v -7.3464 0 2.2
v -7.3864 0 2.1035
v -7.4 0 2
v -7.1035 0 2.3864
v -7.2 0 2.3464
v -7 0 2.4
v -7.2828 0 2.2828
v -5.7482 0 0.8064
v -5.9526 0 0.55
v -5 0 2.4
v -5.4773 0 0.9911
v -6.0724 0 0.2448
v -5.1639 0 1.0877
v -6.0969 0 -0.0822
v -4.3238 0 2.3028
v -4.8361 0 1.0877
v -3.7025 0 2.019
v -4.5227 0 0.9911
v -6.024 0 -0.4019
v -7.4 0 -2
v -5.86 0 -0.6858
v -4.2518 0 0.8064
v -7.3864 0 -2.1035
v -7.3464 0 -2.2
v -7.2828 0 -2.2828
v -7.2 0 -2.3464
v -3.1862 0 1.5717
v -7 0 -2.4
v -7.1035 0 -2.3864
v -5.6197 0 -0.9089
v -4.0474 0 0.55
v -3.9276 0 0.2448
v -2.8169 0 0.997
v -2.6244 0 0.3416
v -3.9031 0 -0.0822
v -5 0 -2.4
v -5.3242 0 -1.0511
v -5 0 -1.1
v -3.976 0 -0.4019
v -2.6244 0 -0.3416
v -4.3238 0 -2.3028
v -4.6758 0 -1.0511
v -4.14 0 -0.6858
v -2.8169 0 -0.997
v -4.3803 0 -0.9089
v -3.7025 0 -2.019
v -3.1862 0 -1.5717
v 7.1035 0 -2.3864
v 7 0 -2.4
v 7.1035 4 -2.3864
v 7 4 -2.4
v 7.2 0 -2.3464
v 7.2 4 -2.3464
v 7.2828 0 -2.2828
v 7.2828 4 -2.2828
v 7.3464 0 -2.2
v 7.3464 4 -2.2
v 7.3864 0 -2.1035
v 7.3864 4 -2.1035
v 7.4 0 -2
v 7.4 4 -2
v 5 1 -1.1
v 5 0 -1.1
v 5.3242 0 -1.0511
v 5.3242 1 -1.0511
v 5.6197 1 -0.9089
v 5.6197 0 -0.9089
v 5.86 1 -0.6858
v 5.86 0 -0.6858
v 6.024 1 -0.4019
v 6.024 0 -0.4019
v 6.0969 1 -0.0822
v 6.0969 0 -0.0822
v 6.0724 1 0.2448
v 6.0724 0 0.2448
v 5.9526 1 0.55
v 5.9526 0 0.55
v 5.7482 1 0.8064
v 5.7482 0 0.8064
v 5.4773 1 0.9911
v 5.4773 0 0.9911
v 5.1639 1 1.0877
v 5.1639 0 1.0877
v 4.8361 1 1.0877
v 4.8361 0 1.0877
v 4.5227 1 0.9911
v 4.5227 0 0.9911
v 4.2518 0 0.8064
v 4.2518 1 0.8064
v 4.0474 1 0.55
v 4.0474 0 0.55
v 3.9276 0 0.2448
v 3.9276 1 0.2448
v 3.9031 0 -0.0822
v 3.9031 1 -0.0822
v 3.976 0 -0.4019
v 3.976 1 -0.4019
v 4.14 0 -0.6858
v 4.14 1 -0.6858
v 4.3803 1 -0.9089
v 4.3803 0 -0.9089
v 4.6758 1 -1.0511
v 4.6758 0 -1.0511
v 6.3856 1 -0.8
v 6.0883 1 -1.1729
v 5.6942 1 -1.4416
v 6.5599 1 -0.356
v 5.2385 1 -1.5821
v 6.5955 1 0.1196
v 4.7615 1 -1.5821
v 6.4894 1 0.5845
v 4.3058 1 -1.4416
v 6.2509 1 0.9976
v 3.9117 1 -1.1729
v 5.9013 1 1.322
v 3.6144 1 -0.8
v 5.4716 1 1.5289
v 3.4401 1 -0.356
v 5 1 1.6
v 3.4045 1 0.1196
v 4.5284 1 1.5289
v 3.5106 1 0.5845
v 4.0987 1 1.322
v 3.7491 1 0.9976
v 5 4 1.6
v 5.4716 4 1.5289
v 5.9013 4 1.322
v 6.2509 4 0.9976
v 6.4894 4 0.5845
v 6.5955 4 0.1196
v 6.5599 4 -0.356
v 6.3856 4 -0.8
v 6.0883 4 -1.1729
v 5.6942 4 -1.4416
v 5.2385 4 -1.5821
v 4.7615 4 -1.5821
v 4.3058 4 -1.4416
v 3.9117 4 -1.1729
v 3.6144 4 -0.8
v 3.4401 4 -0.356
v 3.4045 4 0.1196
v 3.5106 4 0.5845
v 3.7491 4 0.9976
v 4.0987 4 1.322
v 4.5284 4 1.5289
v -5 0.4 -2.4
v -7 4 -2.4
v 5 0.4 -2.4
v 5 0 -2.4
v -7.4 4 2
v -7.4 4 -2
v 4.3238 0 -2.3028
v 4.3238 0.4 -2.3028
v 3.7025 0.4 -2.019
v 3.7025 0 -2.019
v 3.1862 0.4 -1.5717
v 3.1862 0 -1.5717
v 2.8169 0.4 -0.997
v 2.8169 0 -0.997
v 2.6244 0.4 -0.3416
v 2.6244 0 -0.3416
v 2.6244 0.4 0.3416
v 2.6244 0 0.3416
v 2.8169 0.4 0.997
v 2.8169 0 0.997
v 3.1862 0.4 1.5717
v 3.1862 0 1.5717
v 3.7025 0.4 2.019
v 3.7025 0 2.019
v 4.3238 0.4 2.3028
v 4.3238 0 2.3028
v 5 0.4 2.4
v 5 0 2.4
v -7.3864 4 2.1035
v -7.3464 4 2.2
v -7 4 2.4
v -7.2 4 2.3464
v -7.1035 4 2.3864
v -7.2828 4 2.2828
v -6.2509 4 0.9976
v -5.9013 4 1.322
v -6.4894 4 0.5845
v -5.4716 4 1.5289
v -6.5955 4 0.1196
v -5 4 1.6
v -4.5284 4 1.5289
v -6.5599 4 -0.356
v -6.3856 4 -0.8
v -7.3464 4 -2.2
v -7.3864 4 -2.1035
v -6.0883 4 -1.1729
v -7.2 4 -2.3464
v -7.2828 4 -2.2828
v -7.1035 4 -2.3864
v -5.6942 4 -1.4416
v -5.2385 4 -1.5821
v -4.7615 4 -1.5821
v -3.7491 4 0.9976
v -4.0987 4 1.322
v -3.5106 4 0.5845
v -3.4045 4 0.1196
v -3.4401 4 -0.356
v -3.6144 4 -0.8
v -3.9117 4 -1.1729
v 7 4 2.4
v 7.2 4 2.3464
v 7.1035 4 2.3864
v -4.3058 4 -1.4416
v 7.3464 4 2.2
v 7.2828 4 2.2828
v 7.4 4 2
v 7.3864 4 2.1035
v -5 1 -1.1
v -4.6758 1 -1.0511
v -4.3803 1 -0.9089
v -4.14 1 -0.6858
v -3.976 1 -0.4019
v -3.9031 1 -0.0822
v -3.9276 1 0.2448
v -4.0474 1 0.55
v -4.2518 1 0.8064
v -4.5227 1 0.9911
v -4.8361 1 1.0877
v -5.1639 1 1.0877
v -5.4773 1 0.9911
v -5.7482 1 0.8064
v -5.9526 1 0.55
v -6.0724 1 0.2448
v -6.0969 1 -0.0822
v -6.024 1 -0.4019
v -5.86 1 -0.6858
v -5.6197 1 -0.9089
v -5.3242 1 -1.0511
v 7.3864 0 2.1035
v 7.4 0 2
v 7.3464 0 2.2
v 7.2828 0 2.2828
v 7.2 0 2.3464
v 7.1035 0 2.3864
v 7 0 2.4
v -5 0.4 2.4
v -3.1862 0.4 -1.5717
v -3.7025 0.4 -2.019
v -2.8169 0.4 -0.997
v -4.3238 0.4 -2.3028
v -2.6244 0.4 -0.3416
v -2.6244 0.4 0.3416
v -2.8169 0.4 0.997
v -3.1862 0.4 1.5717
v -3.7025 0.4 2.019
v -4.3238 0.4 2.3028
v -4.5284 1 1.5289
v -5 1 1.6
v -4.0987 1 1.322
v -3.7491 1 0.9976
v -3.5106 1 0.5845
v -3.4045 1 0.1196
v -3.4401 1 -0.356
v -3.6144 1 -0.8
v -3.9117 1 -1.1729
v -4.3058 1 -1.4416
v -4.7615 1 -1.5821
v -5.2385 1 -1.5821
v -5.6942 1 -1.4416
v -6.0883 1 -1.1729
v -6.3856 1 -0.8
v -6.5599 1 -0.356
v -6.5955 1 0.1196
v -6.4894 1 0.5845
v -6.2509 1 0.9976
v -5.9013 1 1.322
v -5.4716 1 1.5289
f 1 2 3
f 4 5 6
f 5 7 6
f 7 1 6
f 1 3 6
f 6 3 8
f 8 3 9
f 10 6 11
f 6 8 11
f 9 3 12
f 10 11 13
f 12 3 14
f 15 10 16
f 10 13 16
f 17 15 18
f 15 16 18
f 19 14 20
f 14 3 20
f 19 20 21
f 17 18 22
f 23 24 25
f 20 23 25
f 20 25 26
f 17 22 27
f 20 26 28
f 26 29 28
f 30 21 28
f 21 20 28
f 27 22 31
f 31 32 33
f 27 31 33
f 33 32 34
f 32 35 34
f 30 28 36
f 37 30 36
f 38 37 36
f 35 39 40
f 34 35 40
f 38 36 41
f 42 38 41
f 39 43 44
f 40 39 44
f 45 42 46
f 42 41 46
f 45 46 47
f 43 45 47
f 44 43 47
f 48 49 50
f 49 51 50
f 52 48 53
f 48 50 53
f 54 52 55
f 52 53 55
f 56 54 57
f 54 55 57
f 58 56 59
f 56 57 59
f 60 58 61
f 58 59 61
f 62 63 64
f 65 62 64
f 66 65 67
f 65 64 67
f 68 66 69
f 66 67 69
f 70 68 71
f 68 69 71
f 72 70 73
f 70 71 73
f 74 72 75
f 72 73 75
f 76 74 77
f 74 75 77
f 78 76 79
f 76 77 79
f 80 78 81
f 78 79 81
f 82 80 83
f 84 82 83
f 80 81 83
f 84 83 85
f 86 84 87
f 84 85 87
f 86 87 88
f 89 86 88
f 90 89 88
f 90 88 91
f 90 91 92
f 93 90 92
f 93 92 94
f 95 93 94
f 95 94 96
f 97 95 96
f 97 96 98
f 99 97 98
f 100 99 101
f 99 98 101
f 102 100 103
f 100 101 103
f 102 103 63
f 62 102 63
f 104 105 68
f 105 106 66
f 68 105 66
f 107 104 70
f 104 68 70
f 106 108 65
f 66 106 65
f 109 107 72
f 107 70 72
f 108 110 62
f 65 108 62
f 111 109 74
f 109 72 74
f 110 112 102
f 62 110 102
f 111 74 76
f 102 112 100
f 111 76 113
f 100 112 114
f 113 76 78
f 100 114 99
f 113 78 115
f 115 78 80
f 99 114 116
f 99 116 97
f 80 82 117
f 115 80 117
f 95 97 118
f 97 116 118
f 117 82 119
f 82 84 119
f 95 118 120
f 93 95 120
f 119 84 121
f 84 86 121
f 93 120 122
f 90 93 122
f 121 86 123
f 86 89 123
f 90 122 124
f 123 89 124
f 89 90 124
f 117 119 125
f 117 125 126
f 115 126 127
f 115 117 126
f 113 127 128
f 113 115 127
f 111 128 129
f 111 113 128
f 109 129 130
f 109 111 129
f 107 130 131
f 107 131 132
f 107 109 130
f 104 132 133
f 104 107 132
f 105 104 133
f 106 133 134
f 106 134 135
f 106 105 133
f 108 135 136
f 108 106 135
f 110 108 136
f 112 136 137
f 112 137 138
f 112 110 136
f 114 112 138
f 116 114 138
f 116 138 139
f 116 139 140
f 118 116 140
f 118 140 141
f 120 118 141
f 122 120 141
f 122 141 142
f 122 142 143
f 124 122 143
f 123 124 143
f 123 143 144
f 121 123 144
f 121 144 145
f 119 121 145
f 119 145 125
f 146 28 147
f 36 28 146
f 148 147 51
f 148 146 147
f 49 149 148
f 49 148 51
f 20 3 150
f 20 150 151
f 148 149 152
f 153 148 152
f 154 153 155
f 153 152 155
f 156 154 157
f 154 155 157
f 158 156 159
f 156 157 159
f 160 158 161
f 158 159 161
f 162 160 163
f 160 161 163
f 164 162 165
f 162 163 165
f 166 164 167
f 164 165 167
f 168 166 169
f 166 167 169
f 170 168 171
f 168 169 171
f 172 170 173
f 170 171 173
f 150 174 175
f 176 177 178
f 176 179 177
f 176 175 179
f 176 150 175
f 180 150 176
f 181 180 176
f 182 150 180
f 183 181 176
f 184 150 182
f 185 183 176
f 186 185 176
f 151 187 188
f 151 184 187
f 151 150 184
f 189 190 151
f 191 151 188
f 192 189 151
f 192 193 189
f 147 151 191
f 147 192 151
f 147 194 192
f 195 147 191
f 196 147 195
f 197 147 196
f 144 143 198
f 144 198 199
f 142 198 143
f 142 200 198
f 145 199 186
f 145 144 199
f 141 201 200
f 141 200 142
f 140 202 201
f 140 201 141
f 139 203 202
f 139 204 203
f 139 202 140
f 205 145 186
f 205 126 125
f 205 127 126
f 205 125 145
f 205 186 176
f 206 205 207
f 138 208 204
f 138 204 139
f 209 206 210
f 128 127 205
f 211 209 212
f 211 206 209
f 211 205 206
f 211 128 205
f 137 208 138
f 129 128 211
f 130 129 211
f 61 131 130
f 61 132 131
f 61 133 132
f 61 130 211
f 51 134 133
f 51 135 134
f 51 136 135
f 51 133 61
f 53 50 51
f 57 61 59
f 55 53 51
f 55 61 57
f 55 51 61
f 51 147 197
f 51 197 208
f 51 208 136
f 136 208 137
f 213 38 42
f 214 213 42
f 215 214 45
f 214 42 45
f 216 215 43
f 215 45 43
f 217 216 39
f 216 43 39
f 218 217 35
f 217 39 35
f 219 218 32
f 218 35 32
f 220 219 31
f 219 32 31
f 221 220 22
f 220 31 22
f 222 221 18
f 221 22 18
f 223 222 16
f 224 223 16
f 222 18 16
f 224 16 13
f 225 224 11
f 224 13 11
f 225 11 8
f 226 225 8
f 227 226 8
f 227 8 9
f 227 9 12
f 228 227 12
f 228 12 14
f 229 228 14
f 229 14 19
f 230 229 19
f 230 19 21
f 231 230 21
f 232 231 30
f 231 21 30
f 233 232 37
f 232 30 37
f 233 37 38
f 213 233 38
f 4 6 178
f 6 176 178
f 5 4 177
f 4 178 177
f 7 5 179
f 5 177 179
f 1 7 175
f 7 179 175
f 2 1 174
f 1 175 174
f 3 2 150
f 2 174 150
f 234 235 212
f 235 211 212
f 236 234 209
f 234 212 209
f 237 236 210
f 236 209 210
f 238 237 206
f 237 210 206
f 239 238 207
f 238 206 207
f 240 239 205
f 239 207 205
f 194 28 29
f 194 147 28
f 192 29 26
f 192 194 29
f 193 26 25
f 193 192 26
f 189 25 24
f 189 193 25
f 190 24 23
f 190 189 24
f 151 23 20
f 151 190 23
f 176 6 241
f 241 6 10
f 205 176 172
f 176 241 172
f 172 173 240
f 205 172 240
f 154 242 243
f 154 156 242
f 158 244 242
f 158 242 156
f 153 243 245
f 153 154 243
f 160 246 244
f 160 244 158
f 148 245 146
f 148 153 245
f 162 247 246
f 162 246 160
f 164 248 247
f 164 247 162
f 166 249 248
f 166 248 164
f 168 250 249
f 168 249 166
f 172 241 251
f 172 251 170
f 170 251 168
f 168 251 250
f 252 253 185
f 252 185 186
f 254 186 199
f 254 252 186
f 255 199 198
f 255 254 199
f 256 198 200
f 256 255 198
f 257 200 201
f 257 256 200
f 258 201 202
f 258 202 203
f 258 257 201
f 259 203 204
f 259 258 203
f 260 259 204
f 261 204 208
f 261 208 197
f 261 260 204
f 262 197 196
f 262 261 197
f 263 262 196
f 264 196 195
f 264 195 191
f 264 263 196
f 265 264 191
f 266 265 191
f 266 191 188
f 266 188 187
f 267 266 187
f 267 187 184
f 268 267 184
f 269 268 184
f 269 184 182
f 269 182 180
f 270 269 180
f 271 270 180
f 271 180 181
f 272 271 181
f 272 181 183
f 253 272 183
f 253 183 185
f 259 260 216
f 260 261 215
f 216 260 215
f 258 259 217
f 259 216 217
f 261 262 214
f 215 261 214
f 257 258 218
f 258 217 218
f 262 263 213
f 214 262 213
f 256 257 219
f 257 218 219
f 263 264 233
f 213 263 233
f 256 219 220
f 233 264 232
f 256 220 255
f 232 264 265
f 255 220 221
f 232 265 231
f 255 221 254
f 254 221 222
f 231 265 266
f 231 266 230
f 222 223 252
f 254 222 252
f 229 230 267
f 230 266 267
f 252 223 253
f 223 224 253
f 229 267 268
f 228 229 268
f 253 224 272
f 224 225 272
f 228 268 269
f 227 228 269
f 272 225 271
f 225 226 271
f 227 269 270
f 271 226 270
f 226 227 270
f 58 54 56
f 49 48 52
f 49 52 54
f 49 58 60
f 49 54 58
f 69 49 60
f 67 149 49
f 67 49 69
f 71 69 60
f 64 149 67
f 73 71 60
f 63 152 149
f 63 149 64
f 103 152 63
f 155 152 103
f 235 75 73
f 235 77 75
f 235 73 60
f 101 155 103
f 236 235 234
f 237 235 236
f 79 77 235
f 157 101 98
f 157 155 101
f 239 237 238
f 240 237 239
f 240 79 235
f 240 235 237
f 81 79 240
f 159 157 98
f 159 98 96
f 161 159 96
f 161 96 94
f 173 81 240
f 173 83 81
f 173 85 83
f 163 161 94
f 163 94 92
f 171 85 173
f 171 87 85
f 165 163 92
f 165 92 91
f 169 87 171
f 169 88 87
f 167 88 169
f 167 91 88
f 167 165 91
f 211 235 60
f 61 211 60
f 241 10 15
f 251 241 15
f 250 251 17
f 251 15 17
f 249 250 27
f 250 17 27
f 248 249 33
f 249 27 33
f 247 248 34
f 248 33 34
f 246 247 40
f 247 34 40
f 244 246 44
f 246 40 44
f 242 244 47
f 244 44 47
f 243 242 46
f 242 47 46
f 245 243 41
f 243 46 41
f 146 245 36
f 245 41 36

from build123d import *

# Parameters (mm, degrees)
SKETCH1_W           = 14.8
SKETCH1_H           = 4.8
SKETCH1_R           = 1.6
BOSS_EXTRUDE1_DEPTH = 4
CUT_EXTRUDE2_DEPTH  = 0.4
SKETCH3_R           = 1.6
SKETCH3_R_2         = 1.1
BOSS_EXTRUDE2_DEPTH = 1
FILLET1_R           = 0.4


with BuildPart() as part:
    # Sketch1 → Boss-Extrude1 (new body)
    with BuildSketch(Plane(origin=(0, 0, 0), x_dir=(1, 0, 0), z_dir=(0, 1, 0))):
        Rectangle(SKETCH1_W, SKETCH1_H)
        with Locations(Location((-5, 0, 0), (0, 0, 270))):
            Circle(SKETCH1_R, mode=Mode.SUBTRACT)
        with Locations(Location((5, 0, 0), (0, 0, 270))):
            Circle(SKETCH1_R, mode=Mode.SUBTRACT)
    extrude(amount=BOSS_EXTRUDE1_DEPTH)

    # Sketch2 → Cut-Extrude2 (cut)
    with BuildSketch(Plane.XZ):
        with BuildLine():
            Line((-5, -2.4), (5, -2.4))
            ThreePointArc((5, -2.4), (2.6, 0), (5, 2.4))
            Line((5, 2.4), (-5, 2.4))
            ThreePointArc((-5, 2.4), (-2.6, 0), (-5, -2.4))
        make_face()
    extrude(amount=-CUT_EXTRUDE2_DEPTH, mode=Mode.SUBTRACT)

    # Sketch3 → Boss-Extrude2 (add)
    # profile 1 of 2: a face of its own
    with BuildSketch(Plane.XZ):
        with Locations(Location((5, 0, 0), (0, 0, 90))):
            Circle(SKETCH3_R)
        with Locations(Location((5, 0, 0), (0, 0, 270))):
            Circle(SKETCH3_R_2, mode=Mode.SUBTRACT)
    # profile 2 of 2: a face of its own
    with BuildSketch(Plane.XZ):
        with Locations(Location((-5, 0, 0), (0, 0, 90))):
            Circle(SKETCH3_R)
        with Locations(Location((-5, 0, 0), (0, 0, 270))):
            Circle(SKETCH3_R_2, mode=Mode.SUBTRACT)
    extrude(amount=-BOSS_EXTRUDE2_DEPTH)

    # Fillet1
    fillet1_edges = [part.edges().sort_by_distance(p)[0] for p in [
        (-7.4, 2, -2.4),
        (7.4, 2, -2.4),
        (7.4, 2, 2.4),
        (-7.4, 2, 2.4),
    ]]
    fillet(fillet1_edges, radius=FILLET1_R)


solid = part.part
